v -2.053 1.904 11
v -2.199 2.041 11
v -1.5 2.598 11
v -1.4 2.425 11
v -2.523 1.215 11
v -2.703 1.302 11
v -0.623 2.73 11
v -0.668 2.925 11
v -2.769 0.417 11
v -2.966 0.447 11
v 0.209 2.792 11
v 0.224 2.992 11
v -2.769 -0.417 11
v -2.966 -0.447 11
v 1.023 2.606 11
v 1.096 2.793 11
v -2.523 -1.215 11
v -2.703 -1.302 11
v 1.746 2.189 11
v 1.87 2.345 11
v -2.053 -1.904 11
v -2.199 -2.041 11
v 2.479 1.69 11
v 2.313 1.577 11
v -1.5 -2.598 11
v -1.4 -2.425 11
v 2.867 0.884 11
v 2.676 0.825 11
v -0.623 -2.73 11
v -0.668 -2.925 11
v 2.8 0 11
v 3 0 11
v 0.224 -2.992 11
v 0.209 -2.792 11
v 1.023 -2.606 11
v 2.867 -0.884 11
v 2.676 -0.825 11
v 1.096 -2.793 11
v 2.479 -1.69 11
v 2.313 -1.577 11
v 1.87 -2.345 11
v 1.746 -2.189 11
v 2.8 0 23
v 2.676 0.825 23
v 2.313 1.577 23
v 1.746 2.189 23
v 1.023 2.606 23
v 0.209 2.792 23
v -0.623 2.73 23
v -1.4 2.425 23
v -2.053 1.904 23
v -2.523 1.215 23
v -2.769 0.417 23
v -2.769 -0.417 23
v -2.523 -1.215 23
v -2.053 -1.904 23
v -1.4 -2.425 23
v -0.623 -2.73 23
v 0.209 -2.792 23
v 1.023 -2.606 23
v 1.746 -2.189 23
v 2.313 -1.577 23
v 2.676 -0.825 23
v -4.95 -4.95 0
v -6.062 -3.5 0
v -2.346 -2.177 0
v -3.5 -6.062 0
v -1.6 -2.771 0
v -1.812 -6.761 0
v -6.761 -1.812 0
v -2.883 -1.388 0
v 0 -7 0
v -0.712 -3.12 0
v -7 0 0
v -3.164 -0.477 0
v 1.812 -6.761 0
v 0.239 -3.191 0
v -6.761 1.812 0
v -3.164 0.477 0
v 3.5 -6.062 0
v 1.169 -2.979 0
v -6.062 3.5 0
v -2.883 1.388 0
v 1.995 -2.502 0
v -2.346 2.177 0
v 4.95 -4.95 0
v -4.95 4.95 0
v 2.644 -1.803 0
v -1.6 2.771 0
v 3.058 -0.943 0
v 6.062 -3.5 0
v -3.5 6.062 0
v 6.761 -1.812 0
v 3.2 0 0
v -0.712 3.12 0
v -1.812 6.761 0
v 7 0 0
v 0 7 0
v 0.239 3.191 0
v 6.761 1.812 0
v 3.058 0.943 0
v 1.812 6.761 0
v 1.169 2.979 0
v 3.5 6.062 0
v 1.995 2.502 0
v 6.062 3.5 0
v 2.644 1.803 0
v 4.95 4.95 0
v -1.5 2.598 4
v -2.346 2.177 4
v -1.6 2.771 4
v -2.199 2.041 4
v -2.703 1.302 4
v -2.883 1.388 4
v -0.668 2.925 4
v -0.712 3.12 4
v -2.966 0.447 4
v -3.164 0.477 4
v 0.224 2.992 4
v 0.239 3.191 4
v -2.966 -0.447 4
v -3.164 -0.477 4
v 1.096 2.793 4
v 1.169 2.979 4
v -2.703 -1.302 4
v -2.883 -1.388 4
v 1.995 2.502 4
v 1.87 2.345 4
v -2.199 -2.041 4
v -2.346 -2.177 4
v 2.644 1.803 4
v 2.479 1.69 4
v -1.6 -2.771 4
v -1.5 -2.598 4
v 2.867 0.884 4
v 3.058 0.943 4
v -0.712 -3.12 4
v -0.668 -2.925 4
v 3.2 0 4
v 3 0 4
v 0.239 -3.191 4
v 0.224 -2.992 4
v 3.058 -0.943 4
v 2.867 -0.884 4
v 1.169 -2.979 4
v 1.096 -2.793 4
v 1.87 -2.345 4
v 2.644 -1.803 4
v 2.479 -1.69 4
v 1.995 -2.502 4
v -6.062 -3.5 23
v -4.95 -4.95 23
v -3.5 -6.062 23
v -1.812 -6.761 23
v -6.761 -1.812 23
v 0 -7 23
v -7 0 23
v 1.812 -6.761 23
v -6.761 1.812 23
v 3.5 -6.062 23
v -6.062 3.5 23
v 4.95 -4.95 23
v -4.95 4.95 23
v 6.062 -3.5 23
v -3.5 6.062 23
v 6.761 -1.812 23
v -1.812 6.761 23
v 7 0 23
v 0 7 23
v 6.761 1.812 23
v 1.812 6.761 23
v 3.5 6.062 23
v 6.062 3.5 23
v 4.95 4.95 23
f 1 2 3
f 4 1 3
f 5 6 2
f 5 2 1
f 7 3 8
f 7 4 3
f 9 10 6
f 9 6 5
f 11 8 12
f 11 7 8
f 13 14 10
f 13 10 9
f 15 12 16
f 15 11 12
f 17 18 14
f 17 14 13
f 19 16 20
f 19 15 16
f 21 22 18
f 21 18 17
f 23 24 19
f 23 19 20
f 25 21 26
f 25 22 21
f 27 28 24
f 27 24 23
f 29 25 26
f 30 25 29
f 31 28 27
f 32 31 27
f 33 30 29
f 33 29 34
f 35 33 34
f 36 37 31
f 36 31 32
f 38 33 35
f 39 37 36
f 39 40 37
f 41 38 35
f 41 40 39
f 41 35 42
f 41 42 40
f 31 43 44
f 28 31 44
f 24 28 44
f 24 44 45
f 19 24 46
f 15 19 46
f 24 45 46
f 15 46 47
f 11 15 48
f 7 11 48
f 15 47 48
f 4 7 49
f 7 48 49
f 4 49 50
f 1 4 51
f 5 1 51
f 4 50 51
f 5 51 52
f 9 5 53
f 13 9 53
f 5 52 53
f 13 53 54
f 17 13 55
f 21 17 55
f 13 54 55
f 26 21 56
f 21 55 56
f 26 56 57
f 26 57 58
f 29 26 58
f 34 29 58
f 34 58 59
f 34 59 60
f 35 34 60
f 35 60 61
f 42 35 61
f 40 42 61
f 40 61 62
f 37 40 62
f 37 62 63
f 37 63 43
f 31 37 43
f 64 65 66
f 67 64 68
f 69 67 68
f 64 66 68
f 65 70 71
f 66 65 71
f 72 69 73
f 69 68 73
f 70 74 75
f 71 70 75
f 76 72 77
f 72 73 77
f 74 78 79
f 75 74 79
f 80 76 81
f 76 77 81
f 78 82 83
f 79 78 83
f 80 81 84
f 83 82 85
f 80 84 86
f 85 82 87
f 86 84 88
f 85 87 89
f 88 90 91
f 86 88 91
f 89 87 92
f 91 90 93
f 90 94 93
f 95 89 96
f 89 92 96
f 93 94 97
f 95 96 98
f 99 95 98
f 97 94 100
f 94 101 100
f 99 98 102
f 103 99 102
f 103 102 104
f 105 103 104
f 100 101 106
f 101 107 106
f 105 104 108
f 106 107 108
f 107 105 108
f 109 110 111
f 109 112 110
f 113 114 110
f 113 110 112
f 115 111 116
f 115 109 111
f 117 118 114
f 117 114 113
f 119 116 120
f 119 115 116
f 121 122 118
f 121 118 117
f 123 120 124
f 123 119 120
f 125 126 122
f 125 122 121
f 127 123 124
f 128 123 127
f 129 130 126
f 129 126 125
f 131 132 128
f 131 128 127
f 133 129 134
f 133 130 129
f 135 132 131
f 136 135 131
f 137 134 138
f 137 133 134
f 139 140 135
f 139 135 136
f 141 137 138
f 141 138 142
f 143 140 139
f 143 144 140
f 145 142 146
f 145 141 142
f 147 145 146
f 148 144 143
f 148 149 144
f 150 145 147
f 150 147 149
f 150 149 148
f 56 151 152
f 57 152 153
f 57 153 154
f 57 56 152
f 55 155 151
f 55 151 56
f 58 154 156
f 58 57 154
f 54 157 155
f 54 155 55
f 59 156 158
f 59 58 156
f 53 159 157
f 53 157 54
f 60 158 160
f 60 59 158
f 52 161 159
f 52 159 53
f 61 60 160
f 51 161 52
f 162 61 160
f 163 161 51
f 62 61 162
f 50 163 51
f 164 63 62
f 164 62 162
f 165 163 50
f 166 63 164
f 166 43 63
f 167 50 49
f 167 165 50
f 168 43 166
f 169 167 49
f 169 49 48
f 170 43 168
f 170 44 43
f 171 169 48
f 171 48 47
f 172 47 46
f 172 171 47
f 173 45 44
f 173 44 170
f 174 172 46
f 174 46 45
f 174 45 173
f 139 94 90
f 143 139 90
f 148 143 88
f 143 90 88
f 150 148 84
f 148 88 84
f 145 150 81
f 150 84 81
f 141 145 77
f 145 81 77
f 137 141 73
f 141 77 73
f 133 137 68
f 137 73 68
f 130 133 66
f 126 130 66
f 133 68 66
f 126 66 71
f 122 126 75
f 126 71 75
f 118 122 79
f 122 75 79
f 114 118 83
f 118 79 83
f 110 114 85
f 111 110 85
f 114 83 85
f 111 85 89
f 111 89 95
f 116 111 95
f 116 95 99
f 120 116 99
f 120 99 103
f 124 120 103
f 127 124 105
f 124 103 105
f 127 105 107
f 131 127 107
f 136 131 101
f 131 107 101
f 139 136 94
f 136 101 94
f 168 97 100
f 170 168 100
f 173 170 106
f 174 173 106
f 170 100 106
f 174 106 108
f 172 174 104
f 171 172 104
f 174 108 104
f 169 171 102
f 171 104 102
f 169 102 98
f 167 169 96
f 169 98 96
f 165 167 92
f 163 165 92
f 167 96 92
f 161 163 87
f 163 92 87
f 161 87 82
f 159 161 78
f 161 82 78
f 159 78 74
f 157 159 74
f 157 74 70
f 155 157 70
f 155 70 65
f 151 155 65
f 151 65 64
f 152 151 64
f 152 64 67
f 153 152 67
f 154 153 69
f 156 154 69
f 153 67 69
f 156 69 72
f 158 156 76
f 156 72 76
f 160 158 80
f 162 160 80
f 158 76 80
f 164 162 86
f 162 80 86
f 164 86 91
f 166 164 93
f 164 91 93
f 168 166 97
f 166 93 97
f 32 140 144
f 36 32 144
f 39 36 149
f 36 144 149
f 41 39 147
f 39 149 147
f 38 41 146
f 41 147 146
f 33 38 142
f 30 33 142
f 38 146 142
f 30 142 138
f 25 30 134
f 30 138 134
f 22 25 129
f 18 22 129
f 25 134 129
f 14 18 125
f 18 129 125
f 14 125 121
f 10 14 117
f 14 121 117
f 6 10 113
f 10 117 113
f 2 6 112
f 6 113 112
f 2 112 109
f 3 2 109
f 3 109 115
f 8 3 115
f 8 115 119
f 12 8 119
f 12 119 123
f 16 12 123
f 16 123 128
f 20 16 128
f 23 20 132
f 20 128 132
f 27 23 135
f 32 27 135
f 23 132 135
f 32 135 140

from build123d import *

# Parameters (mm, degrees)
F0_R     = 7
F1_DEPTH = 23
F2_R     = 2.8
F3_DEPTH = 23.001
F4_R     = 3.2
F5_DEPTH = 4
F6_R     = 3
F7_DEPTH = 7


with BuildPart() as f1:
    # F0 (on Top) → F1 (new body)
    with BuildSketch(Plane.XY):
        Circle(F0_R)
    extrude(amount=F1_DEPTH)

    # F2 (on face) → F3 (cut, through all)
    with BuildSketch(Plane.XY.offset(23)):
        Circle(F2_R)
    extrude(amount=-F3_DEPTH, mode=Mode.SUBTRACT)

    # F4 (on face) → F5 (cut)
    with BuildSketch(Plane(origin=(0, 0, 0), x_dir=(1, 0, 0), z_dir=(0, 0, -1))):
        Circle(F4_R)
    extrude(amount=-F5_DEPTH, mode=Mode.SUBTRACT)

    # F6 (on face) → F7 (cut)
    with BuildSketch(Plane(origin=(0, 0, 4), x_dir=(1, 0, 0), z_dir=(0, 0, -1))):
        Circle(F6_R)
    extrude(amount=-F7_DEPTH, mode=Mode.SUBTRACT)


solid = f1.part
